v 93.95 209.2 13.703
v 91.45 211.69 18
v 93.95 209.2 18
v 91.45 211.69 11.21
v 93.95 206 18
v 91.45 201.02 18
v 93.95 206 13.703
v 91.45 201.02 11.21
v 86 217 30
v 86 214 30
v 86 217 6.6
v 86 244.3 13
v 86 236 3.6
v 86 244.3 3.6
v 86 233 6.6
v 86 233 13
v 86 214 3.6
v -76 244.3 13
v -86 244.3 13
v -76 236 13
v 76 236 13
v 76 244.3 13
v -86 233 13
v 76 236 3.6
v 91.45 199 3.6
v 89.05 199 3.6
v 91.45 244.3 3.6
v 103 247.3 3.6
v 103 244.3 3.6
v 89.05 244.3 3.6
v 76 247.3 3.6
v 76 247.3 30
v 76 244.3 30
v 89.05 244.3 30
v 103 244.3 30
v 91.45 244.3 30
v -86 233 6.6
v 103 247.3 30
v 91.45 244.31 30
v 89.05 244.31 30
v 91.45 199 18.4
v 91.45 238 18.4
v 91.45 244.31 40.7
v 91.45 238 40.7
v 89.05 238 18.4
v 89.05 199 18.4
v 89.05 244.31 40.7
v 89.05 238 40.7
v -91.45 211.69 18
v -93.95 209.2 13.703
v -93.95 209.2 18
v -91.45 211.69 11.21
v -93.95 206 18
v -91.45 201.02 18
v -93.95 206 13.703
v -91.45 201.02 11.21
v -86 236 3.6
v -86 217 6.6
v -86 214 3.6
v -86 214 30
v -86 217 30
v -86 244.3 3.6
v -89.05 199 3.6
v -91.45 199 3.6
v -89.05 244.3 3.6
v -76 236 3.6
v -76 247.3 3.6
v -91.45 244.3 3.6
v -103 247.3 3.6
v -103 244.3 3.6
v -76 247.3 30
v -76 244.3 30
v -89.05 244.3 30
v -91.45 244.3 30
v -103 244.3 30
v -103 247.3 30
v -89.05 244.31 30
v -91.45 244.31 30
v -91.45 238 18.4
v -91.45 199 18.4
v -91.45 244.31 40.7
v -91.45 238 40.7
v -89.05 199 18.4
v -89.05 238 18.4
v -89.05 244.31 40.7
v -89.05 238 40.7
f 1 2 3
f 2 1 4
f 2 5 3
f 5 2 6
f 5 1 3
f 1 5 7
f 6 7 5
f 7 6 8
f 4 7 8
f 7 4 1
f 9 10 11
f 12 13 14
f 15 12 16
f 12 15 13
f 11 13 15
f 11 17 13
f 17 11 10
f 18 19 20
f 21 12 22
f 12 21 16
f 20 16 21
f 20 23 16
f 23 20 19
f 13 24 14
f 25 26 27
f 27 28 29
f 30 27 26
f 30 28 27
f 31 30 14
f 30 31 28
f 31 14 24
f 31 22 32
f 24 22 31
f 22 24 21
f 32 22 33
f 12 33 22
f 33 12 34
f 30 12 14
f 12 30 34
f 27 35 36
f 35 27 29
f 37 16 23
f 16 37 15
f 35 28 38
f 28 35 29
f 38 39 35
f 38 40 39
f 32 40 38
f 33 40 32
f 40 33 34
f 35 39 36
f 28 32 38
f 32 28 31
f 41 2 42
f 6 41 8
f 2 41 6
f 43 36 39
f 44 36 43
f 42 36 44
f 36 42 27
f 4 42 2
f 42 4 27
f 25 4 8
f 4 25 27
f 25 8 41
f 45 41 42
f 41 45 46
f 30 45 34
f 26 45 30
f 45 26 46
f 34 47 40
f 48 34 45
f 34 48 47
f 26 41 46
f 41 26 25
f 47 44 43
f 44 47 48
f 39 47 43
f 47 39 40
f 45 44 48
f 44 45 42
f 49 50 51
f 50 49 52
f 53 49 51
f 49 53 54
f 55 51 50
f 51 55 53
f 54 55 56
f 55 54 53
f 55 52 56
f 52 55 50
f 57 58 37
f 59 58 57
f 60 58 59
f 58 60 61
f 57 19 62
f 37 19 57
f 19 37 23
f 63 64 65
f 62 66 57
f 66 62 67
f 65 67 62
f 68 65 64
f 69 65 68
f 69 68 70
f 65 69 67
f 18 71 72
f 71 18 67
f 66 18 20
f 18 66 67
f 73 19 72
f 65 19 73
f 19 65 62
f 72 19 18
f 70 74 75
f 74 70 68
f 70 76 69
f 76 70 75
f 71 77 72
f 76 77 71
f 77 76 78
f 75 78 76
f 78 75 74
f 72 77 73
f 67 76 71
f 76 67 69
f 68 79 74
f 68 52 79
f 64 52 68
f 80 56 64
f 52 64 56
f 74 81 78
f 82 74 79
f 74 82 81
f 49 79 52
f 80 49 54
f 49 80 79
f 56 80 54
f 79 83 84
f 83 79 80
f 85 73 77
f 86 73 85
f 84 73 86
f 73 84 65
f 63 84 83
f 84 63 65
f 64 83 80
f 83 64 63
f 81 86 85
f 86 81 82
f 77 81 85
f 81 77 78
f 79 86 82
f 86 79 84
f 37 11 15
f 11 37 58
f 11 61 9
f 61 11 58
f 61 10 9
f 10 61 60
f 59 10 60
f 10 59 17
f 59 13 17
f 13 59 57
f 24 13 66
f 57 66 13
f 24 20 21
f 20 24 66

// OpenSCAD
// OptiPlex rear cable bar: DRAFT concepts (2026-11-11). No ID yet; unprinted, fit and strength UNKNOWN.
// Spans left-right between the OPX-G rear channels, behind the PC, so cables crossing the rack have a path.
// Fits the OPX-G channels as they are: no change to them.
//  - Slides in from the rear between the channels.
//  - A long spring arm on each end rides the web's inner face and its bump clicks out into the OPX-G cable window,
//    catching the window's rear edge (Y 212). 45 deg catch: pull firmly to remove (retention UNKNOWN).
//  - A flag on each end lands on the ear plate's rear face (Y 244): forward stop.
//  - A column at each end sits between the floor ledge (Z 3.3) and roof ledge (Z 41): no lift.
// Frame as OPX-G: X centred, Z=0 slot bottom, rear post back Y=240, ear plate rear face Y=244.
// Prints upright (Z down on the bed), no supports intended.
part="A";   // A trough, B tie bar, C two-lane trough, keepout

$fn=40;
// OPX-G geometry (read from outputs/OptiPlex_Sleeve_Channels_OPX-G_2026-11-04/src/OPX-G.scad)
web_in=91.75; ledge_top=3.3; roof_low=41.0; ear_back=244; win_rear=212;
// bar
cl=0.3;
z_bot=ledge_top+cl;          // 3.6
y_f=214;  y_b=236;           // body: 42 behind the PC's rear (171.7) for plugs
body_x=86;                   // body ends; arm gap outside it
arm_x0=89.05; arm_x1=web_in-cl;   // 2.4 thick arm, 3.05 gap to flex into
arm_y0=199; arm_top=18.4;
bump=2.5; bz0=11.2; bz1=18.0;     // bump stays where the window's rear edge is straight
flag_x1=103; flag_t=3; flag_top=30;

module along_x(x0,x1){translate([x0,0,0])rotate([90,0,90])linear_extrude(x1-x0)children();}  // 2D (y,z) profile along X

// ---- one end, right side (left is mirrored)
module end(){
 // beam joining the body's rear to the flag
 translate([76,y_b-3,z_bot])cube([body_x-76,ear_back+cl-(y_b-3),13-z_bot]);
 // flag on the ear plate's rear face
 translate([76,ear_back+cl,z_bot])cube([flag_x1-76,flag_t,flag_top-z_bot]);
 // spring arm, rooted in the flag
 translate([arm_x0,arm_y0,z_bot])cube([arm_x1-arm_x0,ear_back+cl-arm_y0+0.01,arm_top-z_bot]);
 // column between floor and roof ledges, behind the cable path
 translate([arm_x0,238,z_bot])cube([arm_x1-arm_x0,ear_back+cl-238+0.01,roof_low-cl-z_bot]);
 // bump: ramp in front, 45 deg catch behind, 45 deg underside for printing
 intersection(){
  translate([0,0,bz0])linear_extrude(bz1-bz0)polygon([[arm_x1-0.01,arm_y0+2],[arm_x1+bump,arm_y0+7],[arm_x1+bump,win_rear-cl-bump],[arm_x1-0.01,win_rear-cl]]);
  translate([0,260,0])rotate([90,0,0])linear_extrude(80)polygon([[arm_x1-0.01,bz0],[arm_x1+bump+1,bz0+bump+1],[arm_x1+bump+1,bz1+1],[arm_x1-0.01,bz1+1]]);
 }
}
module ends(){end();mirror([1,0,0])end();}

// ---- body profiles (y,z)
module trough2d(){
 translate([y_f,z_bot])square([y_b-y_f,3]);            // floor
 translate([y_f,z_bot])square([3,30-z_bot]);            // front wall: keeps cables off the plugs
 translate([y_b-3,z_bot])square([3,13-z_bot]);          // low rear lip: push cables in from behind
}
module A(){along_x(-body_x,body_x)trough2d();ends();}

module C(){along_x(-body_x,body_x){trough2d();translate([224,z_bot])square([2,22-z_bot]);}ends();}  // divider: front lane / rear lane

// B: upright plate with strap slot pairs (velcro up to 12 wide or zip ties) plus a shelf at the bottom
slot_xs=[-60,-20,20,60];
module B(){
 difference(){
  along_x(-body_x,body_x){translate([222,z_bot])square([4,32-z_bot]);translate([y_f,z_bot])square([y_b-y_f,3]);}
  for(x=slot_xs,d=[-5,5])translate([x+d-1.5,221,11])cube([3,6,14]);
 }
 // beam from the plate to the end pieces
 for(s=[-1,1])scale([s,1,1])translate([70,y_f,z_bot])cube([body_x-70,y_b-y_f,13-z_bot]);
 ends();
}

module keepout(){}   // no screws on this part

if(part=="A")A();
else if(part=="B")B();
else if(part=="C")C();
else if(part=="keepout")keepout();
